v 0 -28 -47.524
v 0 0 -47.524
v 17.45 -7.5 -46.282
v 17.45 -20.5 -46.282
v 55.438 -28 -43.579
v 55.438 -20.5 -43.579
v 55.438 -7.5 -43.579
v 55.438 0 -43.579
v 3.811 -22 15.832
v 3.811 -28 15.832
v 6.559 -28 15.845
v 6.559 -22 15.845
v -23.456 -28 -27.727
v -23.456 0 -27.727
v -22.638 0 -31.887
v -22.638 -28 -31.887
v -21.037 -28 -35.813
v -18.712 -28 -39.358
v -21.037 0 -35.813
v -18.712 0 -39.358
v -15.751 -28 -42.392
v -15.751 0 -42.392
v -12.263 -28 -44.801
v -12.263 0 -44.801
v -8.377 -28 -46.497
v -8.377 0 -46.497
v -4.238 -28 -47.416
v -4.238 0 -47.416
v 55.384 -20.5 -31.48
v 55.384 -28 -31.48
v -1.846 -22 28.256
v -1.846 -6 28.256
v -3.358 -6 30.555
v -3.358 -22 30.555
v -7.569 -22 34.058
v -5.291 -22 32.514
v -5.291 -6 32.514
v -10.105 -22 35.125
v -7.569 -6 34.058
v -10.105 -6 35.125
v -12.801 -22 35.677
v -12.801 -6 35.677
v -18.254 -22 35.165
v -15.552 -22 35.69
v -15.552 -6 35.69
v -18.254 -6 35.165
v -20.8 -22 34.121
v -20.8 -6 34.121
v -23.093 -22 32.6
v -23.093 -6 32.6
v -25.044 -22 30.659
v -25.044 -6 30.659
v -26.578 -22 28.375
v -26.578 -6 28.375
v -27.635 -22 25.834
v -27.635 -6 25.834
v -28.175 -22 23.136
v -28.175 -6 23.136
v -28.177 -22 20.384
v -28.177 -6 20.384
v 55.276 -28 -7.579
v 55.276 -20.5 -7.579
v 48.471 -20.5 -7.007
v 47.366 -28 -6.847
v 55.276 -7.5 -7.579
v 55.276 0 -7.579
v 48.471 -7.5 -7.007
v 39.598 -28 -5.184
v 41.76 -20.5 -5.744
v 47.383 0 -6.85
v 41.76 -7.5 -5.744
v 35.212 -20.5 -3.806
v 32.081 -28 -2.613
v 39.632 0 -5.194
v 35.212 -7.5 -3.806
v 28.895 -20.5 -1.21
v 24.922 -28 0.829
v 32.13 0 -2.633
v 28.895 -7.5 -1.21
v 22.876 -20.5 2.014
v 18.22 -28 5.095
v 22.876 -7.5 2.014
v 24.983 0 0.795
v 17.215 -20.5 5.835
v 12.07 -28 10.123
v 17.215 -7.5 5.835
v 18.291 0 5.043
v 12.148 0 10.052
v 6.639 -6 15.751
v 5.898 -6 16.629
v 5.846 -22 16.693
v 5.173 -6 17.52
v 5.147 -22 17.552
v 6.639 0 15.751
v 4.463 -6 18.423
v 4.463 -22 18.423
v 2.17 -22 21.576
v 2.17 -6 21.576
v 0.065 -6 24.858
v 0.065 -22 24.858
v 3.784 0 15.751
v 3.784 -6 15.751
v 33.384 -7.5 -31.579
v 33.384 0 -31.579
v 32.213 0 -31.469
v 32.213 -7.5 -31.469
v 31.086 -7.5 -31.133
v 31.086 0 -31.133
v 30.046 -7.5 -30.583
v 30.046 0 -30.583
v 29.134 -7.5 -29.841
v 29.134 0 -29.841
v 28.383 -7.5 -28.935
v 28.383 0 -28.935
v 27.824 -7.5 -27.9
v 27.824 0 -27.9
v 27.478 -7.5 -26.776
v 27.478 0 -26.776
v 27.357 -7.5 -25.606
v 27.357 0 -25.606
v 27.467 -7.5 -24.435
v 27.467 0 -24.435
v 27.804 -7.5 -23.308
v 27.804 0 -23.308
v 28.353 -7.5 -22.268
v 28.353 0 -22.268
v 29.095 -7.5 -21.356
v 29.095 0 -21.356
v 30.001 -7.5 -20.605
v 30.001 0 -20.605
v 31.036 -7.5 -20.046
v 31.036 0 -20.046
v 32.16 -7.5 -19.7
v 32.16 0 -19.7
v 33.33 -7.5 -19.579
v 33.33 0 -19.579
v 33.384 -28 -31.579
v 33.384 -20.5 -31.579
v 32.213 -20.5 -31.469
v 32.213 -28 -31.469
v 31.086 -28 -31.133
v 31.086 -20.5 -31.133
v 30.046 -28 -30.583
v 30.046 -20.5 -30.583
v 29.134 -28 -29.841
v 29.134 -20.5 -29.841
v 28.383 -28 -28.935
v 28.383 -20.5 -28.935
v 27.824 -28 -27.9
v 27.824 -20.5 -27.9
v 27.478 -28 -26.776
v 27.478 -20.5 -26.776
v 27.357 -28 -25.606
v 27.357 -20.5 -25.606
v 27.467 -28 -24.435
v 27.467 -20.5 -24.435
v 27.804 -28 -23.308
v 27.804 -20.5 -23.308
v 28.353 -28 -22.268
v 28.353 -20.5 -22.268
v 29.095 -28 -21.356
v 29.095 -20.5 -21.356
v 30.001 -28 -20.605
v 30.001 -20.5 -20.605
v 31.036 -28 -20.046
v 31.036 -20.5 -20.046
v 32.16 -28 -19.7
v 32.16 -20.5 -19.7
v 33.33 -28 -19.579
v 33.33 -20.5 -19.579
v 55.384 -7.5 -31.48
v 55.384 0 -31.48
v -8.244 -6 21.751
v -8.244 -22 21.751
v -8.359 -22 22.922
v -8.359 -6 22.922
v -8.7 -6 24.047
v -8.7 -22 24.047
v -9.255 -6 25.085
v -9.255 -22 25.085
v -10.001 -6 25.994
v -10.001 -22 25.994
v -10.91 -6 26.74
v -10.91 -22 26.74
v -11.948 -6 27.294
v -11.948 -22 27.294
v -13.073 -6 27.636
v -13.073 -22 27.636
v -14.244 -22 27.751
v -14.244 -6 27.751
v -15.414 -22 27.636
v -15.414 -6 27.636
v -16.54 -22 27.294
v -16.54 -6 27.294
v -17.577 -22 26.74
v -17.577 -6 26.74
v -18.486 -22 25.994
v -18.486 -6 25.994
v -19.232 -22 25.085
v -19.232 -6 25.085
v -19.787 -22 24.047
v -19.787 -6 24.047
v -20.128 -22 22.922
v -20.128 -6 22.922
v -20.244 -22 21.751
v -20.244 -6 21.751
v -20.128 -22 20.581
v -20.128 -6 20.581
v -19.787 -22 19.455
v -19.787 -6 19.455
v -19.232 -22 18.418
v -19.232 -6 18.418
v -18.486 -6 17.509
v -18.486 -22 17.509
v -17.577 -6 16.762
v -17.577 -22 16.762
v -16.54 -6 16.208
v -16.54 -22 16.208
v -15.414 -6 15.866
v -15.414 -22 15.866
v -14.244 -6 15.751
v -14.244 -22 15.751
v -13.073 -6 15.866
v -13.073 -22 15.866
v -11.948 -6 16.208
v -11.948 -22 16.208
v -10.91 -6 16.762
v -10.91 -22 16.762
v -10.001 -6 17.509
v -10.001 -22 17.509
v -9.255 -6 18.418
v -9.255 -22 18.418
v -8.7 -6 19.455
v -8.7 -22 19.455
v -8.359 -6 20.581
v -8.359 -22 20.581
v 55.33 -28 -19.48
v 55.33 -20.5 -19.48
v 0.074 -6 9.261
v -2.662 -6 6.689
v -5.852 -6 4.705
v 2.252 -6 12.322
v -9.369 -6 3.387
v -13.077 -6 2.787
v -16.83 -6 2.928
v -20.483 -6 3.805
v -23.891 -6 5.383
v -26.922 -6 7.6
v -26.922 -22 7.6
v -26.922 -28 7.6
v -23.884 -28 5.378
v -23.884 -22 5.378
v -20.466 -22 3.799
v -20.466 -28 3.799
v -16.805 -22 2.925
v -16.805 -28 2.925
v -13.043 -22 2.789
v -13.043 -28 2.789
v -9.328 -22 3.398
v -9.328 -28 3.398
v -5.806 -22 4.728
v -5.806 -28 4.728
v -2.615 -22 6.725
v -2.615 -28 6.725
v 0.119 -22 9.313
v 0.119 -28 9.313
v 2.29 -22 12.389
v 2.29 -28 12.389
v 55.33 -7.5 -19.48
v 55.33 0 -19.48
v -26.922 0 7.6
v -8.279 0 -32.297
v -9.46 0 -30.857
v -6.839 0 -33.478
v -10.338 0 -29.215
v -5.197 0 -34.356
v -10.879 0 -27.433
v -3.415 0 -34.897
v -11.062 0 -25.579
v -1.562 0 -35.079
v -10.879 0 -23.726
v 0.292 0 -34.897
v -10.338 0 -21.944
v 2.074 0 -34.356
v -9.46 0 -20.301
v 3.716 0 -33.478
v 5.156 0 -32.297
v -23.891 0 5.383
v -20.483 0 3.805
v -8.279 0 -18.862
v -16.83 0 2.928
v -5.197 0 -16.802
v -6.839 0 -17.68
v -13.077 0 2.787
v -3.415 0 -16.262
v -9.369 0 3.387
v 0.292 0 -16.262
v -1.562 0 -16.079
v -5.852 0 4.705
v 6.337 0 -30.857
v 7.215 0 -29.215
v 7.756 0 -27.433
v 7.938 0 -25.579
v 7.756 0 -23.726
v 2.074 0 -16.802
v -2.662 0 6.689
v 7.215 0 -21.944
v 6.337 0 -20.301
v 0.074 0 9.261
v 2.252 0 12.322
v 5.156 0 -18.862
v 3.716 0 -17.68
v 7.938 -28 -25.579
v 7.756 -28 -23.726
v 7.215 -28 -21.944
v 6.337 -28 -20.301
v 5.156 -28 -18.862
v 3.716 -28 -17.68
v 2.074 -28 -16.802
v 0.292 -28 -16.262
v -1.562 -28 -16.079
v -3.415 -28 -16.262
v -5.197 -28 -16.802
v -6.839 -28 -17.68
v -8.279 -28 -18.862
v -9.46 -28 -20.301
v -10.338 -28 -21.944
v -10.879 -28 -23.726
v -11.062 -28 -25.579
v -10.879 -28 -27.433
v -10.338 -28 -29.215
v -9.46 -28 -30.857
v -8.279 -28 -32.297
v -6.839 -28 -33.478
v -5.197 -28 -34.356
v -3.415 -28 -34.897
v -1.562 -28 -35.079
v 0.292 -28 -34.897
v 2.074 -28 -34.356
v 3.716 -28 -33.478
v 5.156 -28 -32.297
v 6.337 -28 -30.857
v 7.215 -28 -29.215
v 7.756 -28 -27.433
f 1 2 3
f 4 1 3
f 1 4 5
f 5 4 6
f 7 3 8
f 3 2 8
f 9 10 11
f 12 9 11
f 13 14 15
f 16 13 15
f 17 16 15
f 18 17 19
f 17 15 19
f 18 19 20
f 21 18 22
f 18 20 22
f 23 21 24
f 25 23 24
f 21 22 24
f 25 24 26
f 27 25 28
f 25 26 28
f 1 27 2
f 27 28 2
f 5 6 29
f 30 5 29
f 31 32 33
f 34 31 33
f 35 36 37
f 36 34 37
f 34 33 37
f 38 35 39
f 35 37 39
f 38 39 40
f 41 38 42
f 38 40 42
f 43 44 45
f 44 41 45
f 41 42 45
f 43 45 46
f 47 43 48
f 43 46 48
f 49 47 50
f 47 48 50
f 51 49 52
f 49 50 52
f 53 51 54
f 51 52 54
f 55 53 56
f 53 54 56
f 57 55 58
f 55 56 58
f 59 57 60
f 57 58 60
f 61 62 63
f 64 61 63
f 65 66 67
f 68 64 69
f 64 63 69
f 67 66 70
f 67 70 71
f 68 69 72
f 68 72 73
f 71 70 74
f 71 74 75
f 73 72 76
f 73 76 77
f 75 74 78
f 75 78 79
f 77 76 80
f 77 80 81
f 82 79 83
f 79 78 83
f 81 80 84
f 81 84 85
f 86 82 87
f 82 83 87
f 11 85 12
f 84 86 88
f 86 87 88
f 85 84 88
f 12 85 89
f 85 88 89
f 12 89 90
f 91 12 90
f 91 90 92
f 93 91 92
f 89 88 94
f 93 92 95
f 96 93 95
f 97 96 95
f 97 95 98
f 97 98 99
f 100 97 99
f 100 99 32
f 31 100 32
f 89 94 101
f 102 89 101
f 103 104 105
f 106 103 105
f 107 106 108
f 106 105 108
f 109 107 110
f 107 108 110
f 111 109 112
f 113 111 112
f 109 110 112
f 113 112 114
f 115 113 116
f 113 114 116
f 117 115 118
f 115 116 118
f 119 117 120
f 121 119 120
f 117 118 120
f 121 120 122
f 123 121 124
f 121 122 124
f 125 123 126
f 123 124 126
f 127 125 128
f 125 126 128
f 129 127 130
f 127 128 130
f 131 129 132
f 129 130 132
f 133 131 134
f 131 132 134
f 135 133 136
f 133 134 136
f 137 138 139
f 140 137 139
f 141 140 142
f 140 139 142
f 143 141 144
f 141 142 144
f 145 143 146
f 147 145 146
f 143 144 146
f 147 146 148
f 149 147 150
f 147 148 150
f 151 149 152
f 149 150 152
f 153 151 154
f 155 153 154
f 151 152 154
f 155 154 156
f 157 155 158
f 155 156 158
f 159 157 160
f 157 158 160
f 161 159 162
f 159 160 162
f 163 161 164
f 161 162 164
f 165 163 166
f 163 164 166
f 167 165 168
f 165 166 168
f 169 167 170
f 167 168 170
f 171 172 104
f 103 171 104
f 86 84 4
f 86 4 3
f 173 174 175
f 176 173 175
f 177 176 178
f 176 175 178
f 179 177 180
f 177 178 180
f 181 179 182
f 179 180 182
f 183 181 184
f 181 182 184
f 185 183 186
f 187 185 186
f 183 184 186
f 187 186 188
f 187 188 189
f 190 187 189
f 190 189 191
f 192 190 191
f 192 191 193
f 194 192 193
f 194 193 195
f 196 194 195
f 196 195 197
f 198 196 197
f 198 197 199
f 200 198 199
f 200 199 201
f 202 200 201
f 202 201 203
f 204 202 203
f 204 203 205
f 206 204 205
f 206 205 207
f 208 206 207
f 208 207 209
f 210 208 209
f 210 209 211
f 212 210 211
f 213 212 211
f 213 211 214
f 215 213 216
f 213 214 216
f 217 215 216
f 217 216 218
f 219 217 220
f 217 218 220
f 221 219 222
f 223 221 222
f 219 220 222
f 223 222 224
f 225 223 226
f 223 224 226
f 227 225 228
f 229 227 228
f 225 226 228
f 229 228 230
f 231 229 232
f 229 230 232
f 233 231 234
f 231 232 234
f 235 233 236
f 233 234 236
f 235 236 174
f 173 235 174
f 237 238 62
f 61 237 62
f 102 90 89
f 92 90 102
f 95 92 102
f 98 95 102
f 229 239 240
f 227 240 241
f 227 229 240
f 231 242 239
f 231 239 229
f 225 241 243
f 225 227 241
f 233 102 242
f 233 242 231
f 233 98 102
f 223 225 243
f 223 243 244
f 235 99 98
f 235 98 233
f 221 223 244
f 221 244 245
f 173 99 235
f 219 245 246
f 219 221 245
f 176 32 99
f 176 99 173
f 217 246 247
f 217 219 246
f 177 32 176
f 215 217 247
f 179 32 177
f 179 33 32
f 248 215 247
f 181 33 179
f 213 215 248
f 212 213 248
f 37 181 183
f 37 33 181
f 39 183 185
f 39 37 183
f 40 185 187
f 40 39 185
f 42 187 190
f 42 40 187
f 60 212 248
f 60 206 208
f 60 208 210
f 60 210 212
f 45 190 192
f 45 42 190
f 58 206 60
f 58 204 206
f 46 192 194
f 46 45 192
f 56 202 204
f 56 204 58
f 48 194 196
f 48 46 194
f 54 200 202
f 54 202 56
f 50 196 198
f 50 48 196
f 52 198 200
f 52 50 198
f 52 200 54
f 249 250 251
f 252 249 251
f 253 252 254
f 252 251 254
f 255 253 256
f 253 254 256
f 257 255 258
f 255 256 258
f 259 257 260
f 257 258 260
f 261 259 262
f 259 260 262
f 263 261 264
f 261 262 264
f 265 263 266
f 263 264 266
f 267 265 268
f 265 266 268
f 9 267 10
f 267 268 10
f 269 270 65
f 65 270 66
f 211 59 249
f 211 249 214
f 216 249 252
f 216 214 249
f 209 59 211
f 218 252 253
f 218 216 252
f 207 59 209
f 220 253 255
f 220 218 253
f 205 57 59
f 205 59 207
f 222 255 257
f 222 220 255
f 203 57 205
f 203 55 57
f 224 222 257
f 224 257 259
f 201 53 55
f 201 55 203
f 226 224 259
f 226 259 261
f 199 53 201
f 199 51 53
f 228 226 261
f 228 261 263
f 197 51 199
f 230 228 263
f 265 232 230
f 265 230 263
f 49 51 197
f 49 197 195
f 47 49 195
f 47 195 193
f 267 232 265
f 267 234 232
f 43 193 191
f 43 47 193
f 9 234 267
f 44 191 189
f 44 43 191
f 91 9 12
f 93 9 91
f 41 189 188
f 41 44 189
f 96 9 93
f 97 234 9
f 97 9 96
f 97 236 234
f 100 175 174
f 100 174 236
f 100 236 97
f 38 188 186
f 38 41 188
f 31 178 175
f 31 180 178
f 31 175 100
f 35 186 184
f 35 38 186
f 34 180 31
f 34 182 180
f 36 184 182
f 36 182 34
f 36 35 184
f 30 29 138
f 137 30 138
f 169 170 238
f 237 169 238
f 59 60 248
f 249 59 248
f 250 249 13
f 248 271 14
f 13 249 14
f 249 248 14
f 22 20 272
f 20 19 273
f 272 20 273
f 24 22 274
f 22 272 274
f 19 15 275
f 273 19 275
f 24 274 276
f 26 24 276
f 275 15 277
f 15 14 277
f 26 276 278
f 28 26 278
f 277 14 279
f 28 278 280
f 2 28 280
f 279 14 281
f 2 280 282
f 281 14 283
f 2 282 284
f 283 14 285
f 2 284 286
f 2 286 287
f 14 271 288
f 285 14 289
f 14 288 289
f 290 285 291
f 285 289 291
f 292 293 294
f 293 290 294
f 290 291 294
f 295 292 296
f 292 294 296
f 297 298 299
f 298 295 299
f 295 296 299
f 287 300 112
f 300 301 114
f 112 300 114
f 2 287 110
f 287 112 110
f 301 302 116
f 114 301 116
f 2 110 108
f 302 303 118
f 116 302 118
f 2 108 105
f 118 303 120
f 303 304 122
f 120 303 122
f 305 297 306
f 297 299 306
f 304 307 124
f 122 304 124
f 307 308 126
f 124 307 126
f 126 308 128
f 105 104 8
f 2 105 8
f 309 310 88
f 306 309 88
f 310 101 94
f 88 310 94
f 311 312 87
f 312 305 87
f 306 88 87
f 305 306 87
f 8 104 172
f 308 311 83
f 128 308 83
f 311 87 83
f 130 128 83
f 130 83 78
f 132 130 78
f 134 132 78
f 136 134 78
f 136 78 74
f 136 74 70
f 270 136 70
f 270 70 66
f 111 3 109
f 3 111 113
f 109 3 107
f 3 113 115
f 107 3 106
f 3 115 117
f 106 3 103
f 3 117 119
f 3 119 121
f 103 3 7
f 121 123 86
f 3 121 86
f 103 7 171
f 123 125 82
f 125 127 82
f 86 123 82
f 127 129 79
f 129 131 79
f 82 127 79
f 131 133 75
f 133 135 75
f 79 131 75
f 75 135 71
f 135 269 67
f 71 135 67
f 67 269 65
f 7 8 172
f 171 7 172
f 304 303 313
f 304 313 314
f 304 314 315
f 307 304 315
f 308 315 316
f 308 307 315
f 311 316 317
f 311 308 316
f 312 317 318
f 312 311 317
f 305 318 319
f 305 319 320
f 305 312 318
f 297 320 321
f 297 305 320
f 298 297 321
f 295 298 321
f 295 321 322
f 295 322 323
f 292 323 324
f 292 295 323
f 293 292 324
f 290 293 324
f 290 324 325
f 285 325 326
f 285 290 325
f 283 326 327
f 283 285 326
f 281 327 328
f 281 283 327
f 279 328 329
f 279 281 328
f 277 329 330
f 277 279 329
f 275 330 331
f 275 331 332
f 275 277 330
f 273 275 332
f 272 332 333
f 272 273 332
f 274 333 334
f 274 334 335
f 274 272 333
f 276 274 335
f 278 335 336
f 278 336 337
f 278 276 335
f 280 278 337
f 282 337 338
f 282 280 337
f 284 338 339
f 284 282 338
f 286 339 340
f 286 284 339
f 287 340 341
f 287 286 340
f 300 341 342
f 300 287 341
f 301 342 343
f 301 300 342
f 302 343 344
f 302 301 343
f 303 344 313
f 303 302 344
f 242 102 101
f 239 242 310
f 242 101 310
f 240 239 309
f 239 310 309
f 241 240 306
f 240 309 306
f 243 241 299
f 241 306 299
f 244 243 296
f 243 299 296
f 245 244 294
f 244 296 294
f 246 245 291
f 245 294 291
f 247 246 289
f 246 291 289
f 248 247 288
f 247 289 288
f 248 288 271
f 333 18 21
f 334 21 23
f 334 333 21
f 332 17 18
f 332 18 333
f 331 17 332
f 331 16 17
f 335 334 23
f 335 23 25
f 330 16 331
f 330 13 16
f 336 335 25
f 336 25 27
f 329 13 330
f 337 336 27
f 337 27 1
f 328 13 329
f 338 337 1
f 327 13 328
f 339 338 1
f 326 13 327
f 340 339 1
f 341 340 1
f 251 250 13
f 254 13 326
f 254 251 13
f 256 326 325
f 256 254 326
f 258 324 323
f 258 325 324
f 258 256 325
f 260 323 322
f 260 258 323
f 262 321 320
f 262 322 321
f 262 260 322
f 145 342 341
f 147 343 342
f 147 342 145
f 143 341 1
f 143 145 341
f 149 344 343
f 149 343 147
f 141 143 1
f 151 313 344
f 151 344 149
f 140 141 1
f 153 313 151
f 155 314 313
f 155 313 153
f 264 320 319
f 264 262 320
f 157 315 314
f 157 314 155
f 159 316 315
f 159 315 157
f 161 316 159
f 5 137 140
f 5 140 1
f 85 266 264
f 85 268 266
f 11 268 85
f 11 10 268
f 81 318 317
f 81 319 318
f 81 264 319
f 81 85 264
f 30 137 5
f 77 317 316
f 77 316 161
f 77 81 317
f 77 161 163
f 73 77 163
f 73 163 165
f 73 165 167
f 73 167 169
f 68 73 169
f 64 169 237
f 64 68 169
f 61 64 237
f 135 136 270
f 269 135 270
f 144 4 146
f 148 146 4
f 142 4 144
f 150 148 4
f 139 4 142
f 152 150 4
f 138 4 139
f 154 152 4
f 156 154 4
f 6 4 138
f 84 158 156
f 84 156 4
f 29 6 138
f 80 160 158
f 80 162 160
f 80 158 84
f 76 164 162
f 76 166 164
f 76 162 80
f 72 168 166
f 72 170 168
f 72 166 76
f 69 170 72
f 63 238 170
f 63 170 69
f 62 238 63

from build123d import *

# Parameters (mm, degrees)
F0_R      = 9.5
F1_DEPTH  = 28
F3_DEPTH  = 6
F5_R      = 6
F6_DEPTH  = 22.001
F7_W      = 13
F7_H      = 63.7986809015
F8_DEPTH  = 38
F10_DEPTH = 6


with BuildPart() as f1:
    # F0 (on Front) → F1 (new body)
    with BuildSketch(Plane.XZ):
        with BuildLine():
            Line((55.3299104147, -19.4800459675), (55.27629582, -7.5791569764))
            ThreePointArc((55.27629582, -7.5791569764), (21.8781261357, 2.6281537564), (-1.8464281096, 28.2557259496))
            ThreePointArc((-1.8464281096, 28.2557259496), (-18.2536420422, 35.1646349887), (-28.1767553192, 20.3841912865))
            Line((-28.1767553192, 20.3841912865), (-23.4563932978, -27.7273269018))
            ThreePointArc((-23.4563932978, -27.7273269018), (-15.7507812014, -42.3917991939), (0, -47.5236698985))
            Line((0, -47.5236698985), (55.4384774708, -43.5787916566))
            Line((55.4384774708, -43.5787916566), (55.3839715136, -31.4800459675))
            Line((55.3839715136, -31.4800459675), (33.3841947645, -31.5791569764))
            ThreePointArc((33.3841947645, -31.5791569764), (27.3571642151, -25.6061875258), (33.3301336657, -19.5791569764))
            Line((33.3301336657, -19.5791569764), (55.3299104147, -19.4800459675))
        make_face()
        with Locations((-1.5615225292, -25.5791569764)):
            Circle(F0_R, mode=Mode.SUBTRACT)
    extrude(amount=F1_DEPTH)

    # F2 (on face) → F3 (cut)
    with BuildSketch(Plane.XZ.offset(28)):
        with BuildLine():
            ThreePointArc((4.462620132, 18.4232597398), (4.6827707797, 20.0807656893), (4.7563442608, 21.7512085118))
            ThreePointArc((4.7563442608, 21.7512085118), (-21.9929159378, 39.0990892578), (-26.9224943051, 7.6003409546))
            Line((-26.9224943051, 7.6003409546), (-28.1767553192, 20.3841912865))
            ThreePointArc((-28.1767553192, 20.3841912865), (-18.2536420422, 35.1646349887), (-1.8464281096, 28.2557259496))
            ThreePointArc((-1.8464281096, 28.2557259496), (1.0933811252, 23.2017200271), (4.462620132, 18.4232597398))
        make_face()
        with BuildLine():
            ThreePointArc((6.5586960689, 15.8448641244), (5.4946710371, 17.1210654398), (4.462620132, 18.4232597398))
            ThreePointArc((4.462620132, 18.4232597398), (4.1823746256, 17.1164048487), (3.8109479717, 15.8324852676))
            Line((3.8109479717, 15.8324852676), (6.5586960689, 15.8448641244))
        make_face()
        with BuildLine():
            Line((-28.1767553192, 20.3841912865), (-26.9224943051, 7.6003409546))
            ThreePointArc((-26.9224943051, 7.6003409546), (-9.3276855683, 3.3981913953), (3.8109479717, 15.8324852676))
            ThreePointArc((3.8109479717, 15.8324852676), (4.1823746256, 17.1164048487), (4.462620132, 18.4232597398))
            ThreePointArc((4.462620132, 18.4232597398), (1.0933811252, 23.2017200271), (-1.8464281096, 28.2557259496))
            ThreePointArc((-1.8464281096, 28.2557259496), (-18.2536420422, 35.1646349887), (-28.1767553192, 20.3841912865))
        make_face()
    extrude(amount=-F3_DEPTH, mode=Mode.SUBTRACT)

    # F5 (on face) → F6 (cut, through all)
    with BuildSketch(Plane.XZ.offset(22)):
        with Locations((-14.2436557392, 21.7512085118)):
            Circle(F5_R)
    extrude(amount=-F6_DEPTH, mode=Mode.SUBTRACT)

    # F7 (on face) → F8 (cut)
    with BuildSketch(Plane(origin=(55.2410298601, 0, 0.248865898), x_dir=(0, 1, 0), z_dir=(0.9999898522, 0, 0.0045050459))):
        with Locations((-14, -22.6326100528)):
            Rectangle(F7_W, F7_H)
    extrude(amount=-F8_DEPTH, mode=Mode.SUBTRACT)

    # F9 (on face) → F10 (cut)
    with BuildSketch(Plane(origin=(0, 0, 0), x_dir=(-1, 0, 0), z_dir=(0, 1, 0))):
        with BuildLine():
            ThreePointArc((-3.7841006381, 15.7512085118), (17.2827862753, 2.9958443302), (33.2436557392, 21.7512085118))
            ThreePointArc((33.2436557392, 21.7512085118), (11.2045252031, 40.5065726934), (-3.7841006381, 15.7512085118))
        make_face()
        with BuildLine():
            ThreePointArc((-3.7841006381, 15.7512085118), (-4.1718878517, 17.0749114458), (-4.462620132, 18.4232597398))
            ThreePointArc((-4.462620132, 18.4232597398), (-5.5335871793, 17.0732394365), (-6.6389194686, 15.7512085118))
            Line((-6.6389194686, 15.7512085118), (-3.7841006381, 15.7512085118))
        make_face()
    extrude(amount=-F10_DEPTH, mode=Mode.SUBTRACT)


solid = f1.part
